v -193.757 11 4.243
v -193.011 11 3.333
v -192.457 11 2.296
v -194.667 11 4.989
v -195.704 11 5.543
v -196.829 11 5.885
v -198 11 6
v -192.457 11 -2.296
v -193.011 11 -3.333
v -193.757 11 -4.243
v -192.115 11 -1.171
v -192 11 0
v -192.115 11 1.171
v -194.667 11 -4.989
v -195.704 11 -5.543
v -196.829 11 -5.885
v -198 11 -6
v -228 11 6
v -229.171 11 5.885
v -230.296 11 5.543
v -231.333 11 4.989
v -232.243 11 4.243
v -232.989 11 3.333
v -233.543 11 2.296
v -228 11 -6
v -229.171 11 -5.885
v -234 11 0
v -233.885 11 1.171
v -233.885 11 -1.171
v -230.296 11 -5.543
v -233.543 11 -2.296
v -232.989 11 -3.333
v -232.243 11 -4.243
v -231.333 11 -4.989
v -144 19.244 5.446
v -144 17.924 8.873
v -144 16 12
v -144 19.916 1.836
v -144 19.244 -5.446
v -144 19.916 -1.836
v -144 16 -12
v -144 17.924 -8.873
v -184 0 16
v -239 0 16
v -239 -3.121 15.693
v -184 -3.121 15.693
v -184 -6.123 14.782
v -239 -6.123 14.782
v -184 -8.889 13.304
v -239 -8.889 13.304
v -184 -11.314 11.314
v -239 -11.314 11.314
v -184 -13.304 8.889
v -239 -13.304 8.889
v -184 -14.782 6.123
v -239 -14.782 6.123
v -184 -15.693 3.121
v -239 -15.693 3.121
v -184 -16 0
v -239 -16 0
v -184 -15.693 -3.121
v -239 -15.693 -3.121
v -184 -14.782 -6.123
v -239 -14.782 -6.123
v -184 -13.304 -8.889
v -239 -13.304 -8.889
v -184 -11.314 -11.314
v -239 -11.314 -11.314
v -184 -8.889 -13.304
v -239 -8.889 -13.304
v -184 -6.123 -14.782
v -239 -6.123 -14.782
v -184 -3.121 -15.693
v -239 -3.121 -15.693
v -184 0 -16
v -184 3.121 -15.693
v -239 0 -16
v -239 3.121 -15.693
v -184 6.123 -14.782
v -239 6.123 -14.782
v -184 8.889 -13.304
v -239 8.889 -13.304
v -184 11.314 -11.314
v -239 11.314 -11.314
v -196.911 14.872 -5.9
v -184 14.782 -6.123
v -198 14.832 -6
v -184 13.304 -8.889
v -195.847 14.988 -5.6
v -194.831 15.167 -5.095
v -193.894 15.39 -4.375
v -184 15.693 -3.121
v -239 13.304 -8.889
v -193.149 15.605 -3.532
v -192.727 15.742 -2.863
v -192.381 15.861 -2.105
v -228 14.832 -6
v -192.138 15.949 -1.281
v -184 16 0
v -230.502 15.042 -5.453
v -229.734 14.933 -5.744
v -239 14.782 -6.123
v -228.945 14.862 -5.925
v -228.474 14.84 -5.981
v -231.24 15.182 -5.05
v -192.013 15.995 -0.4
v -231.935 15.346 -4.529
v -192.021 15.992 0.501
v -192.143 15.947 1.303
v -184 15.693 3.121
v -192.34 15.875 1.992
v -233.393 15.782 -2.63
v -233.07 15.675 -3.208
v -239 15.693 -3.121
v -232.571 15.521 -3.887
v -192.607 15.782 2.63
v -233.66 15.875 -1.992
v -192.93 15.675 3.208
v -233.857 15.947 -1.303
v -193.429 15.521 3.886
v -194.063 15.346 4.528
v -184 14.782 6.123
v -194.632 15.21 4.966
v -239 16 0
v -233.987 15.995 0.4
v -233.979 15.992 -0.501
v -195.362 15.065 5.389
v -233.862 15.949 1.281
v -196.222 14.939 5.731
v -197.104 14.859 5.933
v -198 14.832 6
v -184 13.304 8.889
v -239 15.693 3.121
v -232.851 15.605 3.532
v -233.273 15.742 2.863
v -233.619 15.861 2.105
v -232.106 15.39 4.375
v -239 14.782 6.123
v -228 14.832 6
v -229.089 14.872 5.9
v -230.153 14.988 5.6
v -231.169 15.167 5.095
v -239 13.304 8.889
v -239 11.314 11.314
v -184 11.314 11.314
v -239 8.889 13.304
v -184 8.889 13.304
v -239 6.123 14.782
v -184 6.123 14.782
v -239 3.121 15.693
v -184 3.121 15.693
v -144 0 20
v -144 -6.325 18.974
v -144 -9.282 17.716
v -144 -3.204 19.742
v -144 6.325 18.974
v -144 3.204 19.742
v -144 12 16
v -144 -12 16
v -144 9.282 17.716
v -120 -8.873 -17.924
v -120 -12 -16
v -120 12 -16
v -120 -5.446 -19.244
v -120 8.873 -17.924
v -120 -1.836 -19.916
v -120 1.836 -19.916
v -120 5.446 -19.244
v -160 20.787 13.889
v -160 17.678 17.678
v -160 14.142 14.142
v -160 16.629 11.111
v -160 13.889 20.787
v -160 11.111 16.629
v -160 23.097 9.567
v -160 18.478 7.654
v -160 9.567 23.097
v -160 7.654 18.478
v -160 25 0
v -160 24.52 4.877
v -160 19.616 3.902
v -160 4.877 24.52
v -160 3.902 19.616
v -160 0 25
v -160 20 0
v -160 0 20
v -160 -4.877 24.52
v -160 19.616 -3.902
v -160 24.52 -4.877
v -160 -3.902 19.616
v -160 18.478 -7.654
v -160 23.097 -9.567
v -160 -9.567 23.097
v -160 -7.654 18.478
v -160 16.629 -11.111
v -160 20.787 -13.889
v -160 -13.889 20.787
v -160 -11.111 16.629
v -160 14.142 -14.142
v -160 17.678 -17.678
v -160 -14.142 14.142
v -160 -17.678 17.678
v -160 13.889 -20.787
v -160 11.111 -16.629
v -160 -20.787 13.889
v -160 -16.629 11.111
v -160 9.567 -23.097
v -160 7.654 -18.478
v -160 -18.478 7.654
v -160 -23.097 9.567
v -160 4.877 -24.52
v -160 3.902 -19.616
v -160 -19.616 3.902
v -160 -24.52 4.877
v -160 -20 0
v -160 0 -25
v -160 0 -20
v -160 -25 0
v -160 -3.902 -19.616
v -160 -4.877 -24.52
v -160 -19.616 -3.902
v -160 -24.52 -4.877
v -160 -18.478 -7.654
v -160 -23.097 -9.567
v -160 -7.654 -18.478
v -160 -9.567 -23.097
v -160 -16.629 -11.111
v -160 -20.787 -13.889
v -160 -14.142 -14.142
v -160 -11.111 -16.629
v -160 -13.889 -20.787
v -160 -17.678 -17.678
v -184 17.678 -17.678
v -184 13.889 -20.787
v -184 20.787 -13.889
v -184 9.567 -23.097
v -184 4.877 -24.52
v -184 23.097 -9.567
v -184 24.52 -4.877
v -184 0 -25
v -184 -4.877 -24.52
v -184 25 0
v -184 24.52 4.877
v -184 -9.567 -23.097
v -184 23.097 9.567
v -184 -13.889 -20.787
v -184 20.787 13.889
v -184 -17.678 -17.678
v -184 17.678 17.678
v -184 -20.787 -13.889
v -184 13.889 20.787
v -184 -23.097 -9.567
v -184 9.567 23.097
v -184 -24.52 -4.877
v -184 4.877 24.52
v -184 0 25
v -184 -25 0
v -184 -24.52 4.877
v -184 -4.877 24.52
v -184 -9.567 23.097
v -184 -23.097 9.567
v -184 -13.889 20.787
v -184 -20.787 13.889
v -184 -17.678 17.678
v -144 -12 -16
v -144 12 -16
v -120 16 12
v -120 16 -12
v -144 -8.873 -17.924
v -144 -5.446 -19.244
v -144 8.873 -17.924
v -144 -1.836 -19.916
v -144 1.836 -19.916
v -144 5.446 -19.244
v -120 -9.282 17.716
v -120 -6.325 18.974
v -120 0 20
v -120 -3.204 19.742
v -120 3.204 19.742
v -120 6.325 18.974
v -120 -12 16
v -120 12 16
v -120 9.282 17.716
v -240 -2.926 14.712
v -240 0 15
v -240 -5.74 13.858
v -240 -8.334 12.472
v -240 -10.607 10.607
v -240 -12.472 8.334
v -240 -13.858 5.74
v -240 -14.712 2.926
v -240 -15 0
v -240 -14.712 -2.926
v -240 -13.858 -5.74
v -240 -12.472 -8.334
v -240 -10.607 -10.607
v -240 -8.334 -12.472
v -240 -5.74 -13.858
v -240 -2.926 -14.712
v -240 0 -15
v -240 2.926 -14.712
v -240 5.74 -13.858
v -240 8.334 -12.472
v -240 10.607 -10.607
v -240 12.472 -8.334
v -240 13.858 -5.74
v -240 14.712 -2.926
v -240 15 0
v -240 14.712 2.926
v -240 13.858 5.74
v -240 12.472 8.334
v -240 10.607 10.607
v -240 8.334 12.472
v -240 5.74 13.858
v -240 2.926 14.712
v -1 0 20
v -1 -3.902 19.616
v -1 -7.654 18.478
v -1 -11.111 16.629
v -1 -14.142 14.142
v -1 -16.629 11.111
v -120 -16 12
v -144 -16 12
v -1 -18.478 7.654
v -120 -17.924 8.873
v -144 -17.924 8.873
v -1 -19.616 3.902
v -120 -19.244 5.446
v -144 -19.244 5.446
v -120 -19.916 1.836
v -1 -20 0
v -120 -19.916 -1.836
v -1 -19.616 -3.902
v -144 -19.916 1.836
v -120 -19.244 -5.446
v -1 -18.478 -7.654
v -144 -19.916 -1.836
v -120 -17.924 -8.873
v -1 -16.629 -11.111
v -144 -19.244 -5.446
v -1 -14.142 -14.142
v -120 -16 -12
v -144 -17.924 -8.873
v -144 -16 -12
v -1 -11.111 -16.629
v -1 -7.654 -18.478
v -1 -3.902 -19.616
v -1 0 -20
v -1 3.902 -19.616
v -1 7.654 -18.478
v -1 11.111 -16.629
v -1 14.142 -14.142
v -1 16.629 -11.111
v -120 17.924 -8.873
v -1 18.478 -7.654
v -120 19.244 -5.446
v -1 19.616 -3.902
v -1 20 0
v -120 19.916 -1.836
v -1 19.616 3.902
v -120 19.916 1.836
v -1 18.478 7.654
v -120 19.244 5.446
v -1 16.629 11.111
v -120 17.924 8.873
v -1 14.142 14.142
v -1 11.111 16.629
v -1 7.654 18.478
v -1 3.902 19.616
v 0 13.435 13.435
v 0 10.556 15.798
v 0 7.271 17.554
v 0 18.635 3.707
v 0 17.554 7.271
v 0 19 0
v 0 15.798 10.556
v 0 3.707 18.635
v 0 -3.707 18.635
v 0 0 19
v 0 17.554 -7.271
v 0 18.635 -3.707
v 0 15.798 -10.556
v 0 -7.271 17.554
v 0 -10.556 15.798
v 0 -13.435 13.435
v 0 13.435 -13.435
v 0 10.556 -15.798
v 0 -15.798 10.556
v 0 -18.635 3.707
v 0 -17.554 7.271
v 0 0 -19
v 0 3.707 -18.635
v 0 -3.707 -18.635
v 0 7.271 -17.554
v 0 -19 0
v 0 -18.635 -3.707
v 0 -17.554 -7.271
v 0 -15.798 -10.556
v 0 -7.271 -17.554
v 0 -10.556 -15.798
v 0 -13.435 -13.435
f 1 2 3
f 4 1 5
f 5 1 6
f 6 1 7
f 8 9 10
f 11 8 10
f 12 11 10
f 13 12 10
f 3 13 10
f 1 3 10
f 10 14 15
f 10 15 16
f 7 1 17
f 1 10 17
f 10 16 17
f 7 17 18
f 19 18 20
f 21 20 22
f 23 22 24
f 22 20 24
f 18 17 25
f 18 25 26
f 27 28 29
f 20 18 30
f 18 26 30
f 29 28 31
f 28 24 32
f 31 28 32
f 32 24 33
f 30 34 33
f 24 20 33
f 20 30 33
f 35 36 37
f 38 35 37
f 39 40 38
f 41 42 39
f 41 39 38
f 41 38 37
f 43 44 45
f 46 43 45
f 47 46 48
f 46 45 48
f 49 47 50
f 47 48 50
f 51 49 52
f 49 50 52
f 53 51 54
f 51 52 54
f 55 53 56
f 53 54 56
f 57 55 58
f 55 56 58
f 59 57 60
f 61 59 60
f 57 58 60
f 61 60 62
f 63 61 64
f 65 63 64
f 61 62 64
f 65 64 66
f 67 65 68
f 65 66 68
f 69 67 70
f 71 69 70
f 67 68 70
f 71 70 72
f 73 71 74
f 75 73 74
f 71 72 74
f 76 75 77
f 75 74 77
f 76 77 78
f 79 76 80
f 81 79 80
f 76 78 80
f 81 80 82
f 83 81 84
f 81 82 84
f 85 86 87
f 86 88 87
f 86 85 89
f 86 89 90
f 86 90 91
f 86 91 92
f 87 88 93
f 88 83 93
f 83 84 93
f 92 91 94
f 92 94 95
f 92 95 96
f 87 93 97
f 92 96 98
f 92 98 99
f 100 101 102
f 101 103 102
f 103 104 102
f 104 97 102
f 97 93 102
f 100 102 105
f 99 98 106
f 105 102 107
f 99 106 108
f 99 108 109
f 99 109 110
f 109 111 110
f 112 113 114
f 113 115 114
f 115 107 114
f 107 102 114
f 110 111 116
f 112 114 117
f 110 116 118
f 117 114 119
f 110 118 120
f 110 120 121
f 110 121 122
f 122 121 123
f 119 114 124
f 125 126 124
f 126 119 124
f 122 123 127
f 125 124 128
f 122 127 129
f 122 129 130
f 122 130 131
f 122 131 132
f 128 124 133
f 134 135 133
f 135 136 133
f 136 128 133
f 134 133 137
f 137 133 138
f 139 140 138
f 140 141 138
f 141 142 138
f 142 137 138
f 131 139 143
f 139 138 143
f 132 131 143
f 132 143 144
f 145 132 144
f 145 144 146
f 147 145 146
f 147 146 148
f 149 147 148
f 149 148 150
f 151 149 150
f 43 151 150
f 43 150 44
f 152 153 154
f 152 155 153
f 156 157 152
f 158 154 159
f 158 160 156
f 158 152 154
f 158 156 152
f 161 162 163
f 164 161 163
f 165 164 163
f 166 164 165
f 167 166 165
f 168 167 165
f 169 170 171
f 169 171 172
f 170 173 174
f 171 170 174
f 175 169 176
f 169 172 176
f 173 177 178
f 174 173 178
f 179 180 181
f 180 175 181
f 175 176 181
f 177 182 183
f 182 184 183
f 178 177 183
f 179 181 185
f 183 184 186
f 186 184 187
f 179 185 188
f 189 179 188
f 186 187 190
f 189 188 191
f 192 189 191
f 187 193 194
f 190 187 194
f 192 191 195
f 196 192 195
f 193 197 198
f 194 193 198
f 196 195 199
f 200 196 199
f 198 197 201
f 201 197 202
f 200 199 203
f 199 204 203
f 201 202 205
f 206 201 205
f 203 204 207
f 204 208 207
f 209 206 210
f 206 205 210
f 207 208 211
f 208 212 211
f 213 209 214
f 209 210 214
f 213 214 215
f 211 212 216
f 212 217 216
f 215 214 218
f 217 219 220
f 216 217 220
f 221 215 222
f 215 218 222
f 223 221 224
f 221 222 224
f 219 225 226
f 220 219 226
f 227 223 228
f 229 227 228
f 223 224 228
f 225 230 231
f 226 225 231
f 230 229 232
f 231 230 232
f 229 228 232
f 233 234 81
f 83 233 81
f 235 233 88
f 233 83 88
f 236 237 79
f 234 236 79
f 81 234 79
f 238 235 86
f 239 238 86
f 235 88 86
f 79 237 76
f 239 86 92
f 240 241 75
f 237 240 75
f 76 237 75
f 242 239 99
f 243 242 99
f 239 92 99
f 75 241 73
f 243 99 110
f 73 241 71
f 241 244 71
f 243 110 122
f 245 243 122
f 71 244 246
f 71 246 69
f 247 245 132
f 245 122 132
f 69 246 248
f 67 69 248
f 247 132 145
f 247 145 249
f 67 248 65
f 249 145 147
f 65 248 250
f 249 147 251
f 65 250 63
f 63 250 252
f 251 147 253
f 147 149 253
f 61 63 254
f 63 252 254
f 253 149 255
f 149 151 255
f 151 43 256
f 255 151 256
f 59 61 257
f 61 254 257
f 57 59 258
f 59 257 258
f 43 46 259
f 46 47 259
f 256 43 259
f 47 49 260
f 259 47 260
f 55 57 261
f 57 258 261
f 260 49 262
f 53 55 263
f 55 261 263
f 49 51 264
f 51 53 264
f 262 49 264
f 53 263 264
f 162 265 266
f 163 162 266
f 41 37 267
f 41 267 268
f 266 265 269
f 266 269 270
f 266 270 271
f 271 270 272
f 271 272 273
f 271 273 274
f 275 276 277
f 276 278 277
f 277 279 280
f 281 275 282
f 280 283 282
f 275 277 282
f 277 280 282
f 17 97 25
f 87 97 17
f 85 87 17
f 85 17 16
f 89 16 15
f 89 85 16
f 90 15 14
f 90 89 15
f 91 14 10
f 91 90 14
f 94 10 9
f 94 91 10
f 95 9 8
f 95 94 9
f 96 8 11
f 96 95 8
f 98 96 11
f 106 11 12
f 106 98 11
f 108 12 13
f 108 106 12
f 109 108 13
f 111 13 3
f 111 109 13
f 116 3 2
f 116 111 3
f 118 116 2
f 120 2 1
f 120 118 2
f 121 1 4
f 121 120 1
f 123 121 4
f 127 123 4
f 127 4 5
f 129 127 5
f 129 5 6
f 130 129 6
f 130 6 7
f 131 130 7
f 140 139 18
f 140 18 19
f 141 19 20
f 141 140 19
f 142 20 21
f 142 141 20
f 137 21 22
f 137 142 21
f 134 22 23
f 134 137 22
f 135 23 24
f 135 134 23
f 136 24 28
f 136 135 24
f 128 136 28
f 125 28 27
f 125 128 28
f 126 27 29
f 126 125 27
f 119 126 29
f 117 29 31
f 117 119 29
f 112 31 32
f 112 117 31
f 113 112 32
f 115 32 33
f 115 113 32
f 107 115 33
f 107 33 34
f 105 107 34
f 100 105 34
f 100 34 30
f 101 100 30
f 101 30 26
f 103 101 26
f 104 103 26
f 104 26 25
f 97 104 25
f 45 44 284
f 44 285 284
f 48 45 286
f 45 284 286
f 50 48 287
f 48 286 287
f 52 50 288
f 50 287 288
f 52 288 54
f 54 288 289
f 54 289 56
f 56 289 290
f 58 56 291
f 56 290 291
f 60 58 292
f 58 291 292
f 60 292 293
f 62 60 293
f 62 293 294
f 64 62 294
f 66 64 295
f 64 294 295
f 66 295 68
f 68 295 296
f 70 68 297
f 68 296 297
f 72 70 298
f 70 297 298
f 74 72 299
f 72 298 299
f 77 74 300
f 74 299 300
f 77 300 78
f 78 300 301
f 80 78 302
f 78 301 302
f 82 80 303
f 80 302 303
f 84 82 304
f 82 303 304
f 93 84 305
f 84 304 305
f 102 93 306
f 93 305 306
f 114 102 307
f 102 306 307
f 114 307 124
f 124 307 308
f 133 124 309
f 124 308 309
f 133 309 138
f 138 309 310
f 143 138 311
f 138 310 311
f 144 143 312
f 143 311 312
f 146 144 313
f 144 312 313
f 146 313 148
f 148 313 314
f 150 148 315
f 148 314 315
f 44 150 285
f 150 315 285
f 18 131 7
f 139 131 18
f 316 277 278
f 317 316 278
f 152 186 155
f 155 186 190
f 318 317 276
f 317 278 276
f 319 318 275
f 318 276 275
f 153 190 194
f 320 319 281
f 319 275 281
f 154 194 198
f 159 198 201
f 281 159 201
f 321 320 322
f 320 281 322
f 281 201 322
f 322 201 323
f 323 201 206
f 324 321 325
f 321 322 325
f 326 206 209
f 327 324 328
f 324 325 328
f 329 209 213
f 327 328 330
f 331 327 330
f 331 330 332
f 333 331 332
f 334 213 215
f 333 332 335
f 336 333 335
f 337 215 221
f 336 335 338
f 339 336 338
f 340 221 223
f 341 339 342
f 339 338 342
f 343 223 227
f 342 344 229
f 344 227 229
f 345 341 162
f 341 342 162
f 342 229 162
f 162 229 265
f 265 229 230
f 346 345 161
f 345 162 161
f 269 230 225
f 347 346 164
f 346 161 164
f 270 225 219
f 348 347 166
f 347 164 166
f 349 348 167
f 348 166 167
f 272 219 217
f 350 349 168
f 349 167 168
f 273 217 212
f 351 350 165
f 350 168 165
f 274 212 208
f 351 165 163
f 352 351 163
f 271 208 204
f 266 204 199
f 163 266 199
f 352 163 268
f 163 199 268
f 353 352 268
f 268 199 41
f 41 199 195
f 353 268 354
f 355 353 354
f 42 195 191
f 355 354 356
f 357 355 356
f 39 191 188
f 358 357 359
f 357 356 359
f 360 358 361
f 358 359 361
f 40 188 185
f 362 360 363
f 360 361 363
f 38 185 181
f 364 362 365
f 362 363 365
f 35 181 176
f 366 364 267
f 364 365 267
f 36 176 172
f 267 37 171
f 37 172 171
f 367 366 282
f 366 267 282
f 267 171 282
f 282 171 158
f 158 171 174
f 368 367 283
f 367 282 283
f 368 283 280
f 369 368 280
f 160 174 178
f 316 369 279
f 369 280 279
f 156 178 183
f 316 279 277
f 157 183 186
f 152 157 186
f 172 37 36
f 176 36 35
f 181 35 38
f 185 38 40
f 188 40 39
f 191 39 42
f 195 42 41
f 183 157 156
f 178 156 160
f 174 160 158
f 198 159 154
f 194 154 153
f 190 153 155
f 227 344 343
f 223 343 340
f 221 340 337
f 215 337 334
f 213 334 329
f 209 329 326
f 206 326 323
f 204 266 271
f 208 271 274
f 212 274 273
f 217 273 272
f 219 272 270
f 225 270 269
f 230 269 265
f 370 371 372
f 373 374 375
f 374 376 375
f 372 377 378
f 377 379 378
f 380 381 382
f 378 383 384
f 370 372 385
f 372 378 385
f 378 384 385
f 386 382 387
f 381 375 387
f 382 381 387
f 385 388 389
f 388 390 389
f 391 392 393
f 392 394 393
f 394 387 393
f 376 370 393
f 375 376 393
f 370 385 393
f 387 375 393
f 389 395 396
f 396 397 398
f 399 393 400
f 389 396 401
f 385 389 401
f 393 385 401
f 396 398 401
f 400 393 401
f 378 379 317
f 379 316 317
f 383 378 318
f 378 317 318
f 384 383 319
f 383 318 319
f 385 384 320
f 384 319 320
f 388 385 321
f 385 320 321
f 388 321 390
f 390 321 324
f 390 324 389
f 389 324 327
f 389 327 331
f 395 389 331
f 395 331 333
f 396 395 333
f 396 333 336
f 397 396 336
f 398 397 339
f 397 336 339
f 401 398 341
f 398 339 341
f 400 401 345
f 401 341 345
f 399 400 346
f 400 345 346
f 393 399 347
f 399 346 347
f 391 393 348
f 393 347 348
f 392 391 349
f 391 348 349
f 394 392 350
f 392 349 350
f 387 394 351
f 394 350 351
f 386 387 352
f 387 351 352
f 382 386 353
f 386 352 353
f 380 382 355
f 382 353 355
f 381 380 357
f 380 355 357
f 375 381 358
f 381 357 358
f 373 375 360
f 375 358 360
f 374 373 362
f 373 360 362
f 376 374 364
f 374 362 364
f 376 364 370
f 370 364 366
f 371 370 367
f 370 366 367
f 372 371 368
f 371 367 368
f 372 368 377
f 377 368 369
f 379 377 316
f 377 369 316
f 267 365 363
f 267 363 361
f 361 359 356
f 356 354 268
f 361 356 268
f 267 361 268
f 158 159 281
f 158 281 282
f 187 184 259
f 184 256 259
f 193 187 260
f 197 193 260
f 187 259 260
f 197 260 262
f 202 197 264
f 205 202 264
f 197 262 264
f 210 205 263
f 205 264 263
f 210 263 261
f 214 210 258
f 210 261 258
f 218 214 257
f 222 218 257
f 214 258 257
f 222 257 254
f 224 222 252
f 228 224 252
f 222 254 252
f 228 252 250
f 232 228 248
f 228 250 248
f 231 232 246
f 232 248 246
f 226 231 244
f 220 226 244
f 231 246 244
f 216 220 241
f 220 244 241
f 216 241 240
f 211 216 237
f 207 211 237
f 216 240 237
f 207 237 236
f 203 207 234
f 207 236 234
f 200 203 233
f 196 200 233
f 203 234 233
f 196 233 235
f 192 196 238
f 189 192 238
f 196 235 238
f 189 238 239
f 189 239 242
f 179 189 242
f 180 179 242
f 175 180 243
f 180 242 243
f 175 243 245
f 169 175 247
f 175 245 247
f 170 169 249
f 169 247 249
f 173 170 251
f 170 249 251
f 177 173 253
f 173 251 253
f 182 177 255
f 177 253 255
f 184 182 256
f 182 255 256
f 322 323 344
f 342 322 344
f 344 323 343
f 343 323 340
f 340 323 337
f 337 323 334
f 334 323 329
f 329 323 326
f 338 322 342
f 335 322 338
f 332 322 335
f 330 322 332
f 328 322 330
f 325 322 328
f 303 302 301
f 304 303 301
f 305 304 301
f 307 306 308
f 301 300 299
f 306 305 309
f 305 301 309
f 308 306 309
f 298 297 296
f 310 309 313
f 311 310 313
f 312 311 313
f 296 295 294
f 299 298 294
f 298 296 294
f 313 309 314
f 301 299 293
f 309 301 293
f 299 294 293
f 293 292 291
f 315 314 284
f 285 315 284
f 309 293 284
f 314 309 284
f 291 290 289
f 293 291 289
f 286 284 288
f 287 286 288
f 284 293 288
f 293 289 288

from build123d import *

# Parameters (mm, degrees)
SKETCH_2_OUTSIDE_W   = 102.04
SKETCH_2_OUTSIDE_H   = 102.04
SKETCH_2_OUTSIDE_W_2 = 32
SKETCH_2_OUTSIDE_H_2 = 32
CUT_EXTRUDE_1_DEPTH  = 24
CUT_EXTRUDE_2_DEPTH  = 5


with BuildPart() as part:
    # Эскиз1 → Повернуть1 (revolve)
    with BuildSketch(Plane.XY, mode=Mode.PRIVATE) as revolve_1_sk:
        Polygon((0, 0), (0, 19), (-1, 20), (-160, 20), (-160, 25), (-184, 25), (-184, 16), (-239, 16), (-240, 15), (-240, 0), align=None)
    revolve(revolve_1_sk.sketch.rotate(Axis((-178.322580645, 0, 0), (1, 0, 0)), 90), axis=Axis((-178.322580645, 0, 0), (1, 0, 0)))

    # Эскиз2 outside → Вырез-Вытянуть1 (cut)
    with BuildSketch(Plane(origin=(-144, 0, 0), x_dir=(0, 0, -1), z_dir=(1, 0, 0))):
        Rectangle(SKETCH_2_OUTSIDE_W, SKETCH_2_OUTSIDE_H)
        Rectangle(SKETCH_2_OUTSIDE_W_2, SKETCH_2_OUTSIDE_H_2, mode=Mode.SUBTRACT)
    extrude(amount=CUT_EXTRUDE_1_DEPTH, mode=Mode.SUBTRACT)

    # Эскиз3 → Вырез-Вытянуть2 (cut)
    with BuildSketch(Plane(origin=(0, 16, 0), x_dir=(1, 0, 0), z_dir=(0, 1, 0))):
        with BuildLine():
            Line((-228, 6), (-198, 6))
            ThreePointArc((-198, 6), (-192, 0), (-198, -6))
            Line((-198, -6), (-228, -6))
            ThreePointArc((-228, -6), (-234, 0), (-228, 6))
        make_face()
    extrude(amount=-CUT_EXTRUDE_2_DEPTH, mode=Mode.SUBTRACT)


solid = part.part
